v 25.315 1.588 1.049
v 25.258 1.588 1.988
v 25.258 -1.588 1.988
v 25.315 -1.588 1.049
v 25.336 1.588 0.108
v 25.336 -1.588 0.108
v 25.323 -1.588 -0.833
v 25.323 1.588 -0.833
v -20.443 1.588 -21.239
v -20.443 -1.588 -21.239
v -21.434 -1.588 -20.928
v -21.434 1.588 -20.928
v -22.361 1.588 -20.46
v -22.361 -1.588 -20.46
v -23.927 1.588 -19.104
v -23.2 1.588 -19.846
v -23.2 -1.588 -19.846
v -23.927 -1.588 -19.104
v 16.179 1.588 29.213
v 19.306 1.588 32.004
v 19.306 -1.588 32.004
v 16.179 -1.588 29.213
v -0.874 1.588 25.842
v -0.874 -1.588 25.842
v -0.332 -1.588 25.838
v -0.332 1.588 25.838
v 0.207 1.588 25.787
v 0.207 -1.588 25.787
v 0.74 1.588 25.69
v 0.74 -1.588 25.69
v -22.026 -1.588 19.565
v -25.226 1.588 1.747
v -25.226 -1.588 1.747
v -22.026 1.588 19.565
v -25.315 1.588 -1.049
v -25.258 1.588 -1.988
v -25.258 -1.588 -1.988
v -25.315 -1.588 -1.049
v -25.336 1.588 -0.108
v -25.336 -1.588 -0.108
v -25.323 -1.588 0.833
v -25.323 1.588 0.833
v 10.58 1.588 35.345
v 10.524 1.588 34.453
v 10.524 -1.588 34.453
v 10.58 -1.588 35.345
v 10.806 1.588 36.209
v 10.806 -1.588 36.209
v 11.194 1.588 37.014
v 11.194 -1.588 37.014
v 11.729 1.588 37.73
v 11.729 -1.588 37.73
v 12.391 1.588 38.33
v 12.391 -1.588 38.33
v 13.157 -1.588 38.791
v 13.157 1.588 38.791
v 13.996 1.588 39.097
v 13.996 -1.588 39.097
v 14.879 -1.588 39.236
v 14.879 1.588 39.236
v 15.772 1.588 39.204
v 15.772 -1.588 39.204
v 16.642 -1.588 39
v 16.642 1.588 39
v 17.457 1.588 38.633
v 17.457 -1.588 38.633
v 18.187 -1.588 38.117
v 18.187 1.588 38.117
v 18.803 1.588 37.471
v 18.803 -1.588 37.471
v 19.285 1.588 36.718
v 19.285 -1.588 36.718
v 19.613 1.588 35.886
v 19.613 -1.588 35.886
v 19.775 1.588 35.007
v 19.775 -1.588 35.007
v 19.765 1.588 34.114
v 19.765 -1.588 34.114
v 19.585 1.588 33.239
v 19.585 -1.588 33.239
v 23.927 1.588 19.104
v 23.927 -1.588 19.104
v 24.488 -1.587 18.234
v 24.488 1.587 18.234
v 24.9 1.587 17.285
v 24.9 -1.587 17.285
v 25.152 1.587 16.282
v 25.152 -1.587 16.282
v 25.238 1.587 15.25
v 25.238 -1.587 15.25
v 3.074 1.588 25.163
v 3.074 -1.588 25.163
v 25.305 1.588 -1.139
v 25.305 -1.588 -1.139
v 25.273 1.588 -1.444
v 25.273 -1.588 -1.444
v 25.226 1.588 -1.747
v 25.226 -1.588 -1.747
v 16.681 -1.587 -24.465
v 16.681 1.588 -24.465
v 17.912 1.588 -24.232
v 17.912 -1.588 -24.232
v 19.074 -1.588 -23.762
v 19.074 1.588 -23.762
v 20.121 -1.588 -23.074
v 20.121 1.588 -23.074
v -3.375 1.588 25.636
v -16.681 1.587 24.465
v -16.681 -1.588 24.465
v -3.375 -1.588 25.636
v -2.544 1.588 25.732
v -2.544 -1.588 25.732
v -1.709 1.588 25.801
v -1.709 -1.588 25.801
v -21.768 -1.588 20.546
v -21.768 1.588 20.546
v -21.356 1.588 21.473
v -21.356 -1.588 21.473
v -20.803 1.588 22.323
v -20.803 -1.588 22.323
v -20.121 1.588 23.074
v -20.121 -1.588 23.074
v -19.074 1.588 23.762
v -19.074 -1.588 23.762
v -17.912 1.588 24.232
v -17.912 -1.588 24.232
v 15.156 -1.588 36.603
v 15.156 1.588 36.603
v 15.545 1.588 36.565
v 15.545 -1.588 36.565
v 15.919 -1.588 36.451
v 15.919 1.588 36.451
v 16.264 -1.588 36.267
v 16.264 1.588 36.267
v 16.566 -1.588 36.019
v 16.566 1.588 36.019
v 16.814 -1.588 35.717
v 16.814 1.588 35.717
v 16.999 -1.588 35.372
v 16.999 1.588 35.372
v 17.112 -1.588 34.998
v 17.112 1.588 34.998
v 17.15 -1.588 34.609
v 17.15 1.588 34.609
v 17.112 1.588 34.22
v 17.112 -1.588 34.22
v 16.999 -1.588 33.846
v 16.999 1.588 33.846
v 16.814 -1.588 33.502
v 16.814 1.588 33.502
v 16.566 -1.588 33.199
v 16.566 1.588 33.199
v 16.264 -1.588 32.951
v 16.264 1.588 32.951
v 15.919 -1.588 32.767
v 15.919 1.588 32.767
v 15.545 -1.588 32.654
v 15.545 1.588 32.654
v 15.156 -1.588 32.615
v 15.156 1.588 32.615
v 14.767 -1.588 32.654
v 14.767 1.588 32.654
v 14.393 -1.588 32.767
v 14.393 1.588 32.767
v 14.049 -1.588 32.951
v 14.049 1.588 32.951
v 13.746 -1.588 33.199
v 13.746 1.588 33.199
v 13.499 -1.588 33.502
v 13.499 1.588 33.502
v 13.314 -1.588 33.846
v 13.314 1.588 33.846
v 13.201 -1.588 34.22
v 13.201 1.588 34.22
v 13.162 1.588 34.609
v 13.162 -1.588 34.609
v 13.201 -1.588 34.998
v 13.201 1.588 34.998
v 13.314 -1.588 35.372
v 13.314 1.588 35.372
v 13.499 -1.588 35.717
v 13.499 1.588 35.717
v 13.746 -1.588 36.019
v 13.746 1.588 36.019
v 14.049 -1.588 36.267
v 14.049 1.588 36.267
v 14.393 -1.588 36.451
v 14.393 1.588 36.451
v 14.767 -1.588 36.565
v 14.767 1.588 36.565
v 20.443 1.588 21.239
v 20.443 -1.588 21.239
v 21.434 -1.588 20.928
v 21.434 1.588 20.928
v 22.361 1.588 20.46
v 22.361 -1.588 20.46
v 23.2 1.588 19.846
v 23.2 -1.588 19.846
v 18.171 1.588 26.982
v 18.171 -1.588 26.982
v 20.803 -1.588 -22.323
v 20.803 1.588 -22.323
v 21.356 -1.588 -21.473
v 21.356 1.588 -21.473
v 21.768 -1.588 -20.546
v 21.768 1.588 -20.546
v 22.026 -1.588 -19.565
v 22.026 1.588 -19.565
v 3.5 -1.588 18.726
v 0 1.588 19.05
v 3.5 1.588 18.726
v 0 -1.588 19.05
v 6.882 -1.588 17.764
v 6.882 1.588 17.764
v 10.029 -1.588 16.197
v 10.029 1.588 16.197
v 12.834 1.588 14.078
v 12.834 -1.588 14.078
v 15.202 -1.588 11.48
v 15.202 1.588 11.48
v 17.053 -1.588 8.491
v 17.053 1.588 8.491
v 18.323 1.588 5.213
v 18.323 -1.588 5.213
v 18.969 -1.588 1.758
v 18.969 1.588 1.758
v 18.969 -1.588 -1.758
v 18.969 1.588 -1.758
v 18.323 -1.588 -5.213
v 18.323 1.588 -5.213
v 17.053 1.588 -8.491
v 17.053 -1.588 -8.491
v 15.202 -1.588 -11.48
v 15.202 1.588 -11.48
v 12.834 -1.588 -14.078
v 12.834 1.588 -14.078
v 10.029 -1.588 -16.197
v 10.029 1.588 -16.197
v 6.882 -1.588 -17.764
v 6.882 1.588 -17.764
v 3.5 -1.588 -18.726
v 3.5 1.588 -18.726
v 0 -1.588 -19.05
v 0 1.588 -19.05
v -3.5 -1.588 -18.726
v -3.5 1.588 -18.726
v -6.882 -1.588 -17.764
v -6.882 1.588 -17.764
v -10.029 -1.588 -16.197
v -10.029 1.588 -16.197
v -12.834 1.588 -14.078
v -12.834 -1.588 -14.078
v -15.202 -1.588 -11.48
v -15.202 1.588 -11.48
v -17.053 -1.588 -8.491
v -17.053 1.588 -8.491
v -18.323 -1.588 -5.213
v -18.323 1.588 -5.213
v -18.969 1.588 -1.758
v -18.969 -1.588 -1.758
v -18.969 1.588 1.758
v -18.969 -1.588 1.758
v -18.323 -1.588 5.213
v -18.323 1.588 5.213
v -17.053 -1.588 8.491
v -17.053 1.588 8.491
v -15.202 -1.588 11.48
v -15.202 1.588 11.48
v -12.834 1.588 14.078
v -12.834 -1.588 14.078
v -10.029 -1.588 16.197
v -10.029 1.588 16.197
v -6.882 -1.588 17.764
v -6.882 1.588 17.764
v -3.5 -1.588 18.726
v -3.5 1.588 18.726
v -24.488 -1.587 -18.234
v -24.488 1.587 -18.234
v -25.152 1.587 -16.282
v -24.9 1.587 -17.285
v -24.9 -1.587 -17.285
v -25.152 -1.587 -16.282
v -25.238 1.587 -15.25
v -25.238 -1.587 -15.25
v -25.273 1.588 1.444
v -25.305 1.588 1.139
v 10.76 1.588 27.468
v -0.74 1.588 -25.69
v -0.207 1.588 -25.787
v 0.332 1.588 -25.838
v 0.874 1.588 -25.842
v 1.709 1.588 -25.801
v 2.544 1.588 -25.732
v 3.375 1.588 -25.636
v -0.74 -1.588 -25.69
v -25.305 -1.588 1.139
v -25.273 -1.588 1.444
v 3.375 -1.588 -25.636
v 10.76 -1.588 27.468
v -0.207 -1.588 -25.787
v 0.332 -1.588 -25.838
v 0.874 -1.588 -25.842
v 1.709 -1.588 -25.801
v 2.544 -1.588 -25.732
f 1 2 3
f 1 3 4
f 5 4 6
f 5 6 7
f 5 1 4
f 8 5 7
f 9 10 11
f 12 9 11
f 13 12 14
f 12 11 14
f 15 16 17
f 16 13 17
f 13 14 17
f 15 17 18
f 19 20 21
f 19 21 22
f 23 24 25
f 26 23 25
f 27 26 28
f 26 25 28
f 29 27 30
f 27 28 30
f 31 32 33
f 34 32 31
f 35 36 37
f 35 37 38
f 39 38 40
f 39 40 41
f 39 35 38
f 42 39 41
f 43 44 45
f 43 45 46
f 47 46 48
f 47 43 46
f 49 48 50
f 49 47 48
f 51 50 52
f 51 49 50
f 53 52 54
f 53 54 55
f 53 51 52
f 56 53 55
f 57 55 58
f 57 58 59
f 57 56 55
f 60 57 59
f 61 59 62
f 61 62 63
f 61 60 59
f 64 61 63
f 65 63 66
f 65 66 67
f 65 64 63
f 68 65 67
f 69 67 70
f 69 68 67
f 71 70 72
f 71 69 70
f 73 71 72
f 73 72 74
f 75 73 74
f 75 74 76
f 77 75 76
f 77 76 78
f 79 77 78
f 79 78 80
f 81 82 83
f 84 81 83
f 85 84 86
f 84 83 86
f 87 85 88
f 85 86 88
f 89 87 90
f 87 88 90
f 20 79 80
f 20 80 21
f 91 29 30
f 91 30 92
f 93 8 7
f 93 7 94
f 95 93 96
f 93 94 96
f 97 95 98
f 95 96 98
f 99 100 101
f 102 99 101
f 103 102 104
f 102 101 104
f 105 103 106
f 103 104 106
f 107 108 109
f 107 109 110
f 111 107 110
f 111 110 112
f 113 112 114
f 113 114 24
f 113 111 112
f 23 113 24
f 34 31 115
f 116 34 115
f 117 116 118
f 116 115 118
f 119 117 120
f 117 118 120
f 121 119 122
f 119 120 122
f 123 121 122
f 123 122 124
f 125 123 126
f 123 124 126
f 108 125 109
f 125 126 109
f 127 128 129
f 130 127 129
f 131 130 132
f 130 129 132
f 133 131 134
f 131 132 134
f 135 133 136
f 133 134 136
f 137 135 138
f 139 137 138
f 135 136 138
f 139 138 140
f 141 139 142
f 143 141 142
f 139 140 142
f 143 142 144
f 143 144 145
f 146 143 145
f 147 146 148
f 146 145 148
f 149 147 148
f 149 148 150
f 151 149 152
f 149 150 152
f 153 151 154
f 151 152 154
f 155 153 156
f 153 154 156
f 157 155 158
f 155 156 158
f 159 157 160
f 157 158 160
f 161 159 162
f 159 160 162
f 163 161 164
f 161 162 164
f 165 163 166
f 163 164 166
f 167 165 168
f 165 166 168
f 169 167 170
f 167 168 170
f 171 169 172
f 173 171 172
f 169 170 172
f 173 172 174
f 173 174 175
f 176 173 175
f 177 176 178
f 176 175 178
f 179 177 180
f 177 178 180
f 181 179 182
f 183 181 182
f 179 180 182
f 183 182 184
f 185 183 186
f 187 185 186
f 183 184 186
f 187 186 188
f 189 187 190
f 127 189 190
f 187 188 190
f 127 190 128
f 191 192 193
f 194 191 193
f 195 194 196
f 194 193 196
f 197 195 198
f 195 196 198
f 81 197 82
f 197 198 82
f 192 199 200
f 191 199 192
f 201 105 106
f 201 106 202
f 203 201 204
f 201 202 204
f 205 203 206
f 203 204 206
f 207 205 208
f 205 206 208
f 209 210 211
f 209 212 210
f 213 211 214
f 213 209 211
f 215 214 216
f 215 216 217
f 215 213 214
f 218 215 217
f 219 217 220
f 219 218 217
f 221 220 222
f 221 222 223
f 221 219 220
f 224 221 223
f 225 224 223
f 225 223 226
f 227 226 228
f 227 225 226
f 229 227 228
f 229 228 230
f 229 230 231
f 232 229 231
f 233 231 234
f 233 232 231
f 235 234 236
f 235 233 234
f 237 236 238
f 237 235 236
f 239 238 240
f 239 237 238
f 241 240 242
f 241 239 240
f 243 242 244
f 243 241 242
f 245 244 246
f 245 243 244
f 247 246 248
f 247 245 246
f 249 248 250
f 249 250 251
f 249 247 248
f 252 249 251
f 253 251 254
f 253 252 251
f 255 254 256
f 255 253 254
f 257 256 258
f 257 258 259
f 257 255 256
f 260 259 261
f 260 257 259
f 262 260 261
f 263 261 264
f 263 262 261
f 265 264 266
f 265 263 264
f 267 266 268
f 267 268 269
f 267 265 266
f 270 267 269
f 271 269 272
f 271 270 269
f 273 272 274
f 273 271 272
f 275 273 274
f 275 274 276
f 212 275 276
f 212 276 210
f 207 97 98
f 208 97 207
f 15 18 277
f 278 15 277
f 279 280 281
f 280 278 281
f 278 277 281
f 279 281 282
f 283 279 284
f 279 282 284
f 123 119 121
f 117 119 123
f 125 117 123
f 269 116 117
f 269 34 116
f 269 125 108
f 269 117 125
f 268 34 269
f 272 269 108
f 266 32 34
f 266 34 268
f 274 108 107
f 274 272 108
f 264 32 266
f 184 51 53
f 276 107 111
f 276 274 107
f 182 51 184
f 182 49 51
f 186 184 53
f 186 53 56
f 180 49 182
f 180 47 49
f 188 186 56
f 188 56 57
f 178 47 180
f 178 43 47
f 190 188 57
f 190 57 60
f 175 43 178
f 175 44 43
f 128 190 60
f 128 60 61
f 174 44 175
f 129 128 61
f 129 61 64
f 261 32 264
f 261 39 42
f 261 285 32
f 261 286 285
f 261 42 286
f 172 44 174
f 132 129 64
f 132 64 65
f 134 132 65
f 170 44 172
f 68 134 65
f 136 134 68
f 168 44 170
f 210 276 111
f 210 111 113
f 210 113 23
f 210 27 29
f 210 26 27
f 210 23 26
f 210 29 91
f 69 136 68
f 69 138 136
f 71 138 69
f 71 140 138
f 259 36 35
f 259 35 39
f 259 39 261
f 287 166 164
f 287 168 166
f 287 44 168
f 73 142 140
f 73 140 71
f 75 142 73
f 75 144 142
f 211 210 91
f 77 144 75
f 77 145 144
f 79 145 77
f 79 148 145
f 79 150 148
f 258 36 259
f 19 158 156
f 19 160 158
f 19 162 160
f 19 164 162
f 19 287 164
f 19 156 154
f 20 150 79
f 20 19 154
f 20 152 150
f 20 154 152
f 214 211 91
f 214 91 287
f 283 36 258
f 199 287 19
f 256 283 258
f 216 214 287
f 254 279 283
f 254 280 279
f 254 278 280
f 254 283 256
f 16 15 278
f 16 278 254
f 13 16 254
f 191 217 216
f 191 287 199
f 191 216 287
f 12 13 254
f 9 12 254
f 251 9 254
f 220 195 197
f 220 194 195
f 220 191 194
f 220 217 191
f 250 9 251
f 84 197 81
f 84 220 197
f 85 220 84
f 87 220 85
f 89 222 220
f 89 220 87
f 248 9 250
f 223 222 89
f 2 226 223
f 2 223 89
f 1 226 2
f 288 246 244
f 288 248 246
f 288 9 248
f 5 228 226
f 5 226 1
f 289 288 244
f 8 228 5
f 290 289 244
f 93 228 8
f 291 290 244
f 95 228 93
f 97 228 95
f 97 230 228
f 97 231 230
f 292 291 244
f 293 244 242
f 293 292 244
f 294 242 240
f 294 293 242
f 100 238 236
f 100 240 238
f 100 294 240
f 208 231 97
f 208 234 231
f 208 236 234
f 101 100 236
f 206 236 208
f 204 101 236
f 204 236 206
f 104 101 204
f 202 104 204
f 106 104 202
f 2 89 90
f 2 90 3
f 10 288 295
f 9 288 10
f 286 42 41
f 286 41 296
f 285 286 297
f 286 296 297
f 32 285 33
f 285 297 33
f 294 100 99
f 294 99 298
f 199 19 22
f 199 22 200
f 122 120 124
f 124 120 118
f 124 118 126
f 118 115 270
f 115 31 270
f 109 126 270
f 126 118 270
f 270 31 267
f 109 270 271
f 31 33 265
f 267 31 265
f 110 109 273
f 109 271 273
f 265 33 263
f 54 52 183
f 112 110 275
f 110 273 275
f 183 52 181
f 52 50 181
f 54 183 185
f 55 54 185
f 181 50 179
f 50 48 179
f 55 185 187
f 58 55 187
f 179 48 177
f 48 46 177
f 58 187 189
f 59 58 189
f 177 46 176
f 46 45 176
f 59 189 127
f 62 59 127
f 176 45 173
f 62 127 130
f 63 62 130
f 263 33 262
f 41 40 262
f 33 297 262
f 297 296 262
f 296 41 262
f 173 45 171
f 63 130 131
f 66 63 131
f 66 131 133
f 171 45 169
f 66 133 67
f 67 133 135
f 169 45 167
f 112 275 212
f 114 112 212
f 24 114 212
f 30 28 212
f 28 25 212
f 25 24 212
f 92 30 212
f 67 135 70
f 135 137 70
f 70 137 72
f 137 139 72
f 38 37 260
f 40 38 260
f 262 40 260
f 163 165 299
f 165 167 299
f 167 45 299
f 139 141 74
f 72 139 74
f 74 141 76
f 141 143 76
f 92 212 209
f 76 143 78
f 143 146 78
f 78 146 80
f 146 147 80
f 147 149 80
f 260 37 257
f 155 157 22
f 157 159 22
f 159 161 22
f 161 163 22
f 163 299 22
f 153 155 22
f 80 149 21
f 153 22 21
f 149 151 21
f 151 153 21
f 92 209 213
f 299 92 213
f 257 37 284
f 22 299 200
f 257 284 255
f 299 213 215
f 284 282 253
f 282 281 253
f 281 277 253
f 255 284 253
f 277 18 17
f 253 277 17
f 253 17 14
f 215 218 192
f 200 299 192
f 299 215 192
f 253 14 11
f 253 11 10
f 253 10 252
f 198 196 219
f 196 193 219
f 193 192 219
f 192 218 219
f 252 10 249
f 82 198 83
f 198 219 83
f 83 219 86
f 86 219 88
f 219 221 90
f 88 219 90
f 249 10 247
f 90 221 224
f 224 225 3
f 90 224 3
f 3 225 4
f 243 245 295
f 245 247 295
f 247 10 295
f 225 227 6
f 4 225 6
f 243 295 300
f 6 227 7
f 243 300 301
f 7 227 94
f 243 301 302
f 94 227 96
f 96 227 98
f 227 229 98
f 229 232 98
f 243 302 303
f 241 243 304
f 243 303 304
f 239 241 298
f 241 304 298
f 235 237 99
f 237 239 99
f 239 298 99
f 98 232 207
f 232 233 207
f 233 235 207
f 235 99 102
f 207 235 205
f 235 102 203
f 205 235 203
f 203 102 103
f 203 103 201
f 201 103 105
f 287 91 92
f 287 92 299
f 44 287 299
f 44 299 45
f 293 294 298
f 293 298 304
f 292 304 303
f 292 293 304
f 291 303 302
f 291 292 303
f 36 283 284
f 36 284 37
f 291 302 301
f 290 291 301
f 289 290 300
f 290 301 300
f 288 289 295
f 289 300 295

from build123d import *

# Parameters (mm, degrees)
SKETCH1_R           = 19.05
BOSS_EXTRUDE1_DEPTH = 1.5875
FILLET1_R           = 6.35
SKETCH4_R           = 1.9939
BOSS_EXTRUDE2_DEPTH = 3.175


with BuildPart() as part:
    # Sketch1 → Boss-Extrude1 (new, symmetric)
    with BuildSketch(Plane(origin=(0, 0, 0), x_dir=(1, 0, 0), z_dir=(0, 1, 0))):
        with BuildLine():
            Line((0, 25.8572), (-22.49266633, 20.776091776))
            ThreePointArc((-22.49266633, 20.776091776), (-23.925232015, 19.108880164), (-25.234496658, 17.343189053))
            Line((-25.234496658, 17.343189053), (-25.258396026, 1.987878879))
            ThreePointArc((-25.258396026, 1.987878879), (-25.334329361, 0.331644538), (-25.301777207, -1.326009955))
            Line((-25.301777207, -1.326009955), (-21.651397508, -21.651397508))
            ThreePointArc((-21.651397508, -21.651397508), (-20.188971055, -23.021109353), (-18.640092328, -24.292241274))
            Line((-18.640092328, -24.292241274), (-3.375041857, -25.63598807))
            ThreePointArc((-3.375041857, -25.63598807), (-1.691141793, -25.80183775), (0, -25.8572))
            Line((0, -25.8572), (22.49266633, -20.776091776))
            ThreePointArc((22.49266633, -20.776091776), (23.925232015, -19.108880164), (25.234496658, -17.343189053))
            Line((25.234496658, -17.343189053), (25.258396026, -1.987878879))
            ThreePointArc((25.258396026, -1.987878879), (25.334329361, -0.331644538), (25.301777207, 1.326009955))
            Line((25.301777207, 1.326009955), (21.651397508, 21.651397508))
            ThreePointArc((21.651397508, 21.651397508), (20.188971055, 23.021109353), (18.640092328, 24.292241274))
            Line((18.640092328, 24.292241274), (3.375041857, 25.63598807))
            ThreePointArc((3.375041857, 25.63598807), (1.691141793, 25.80183775), (0, 25.8572))
        make_face()
        with Locations(Location((0, 0, 0), (0, 0, 270))):
            Circle(SKETCH1_R, mode=Mode.SUBTRACT)
    extrude(amount=BOSS_EXTRUDE1_DEPTH, both=True)

    # Fillet1
    # the kernel refuses this fillet: 6.35 mm, written as the material it takes off along each edge
    with BuildSketch(Plane(origin=(25.301777207, -2.821548673, -1.326009955), x_dir=(-0.17676882960283344, 0, -0.9842523969393442), z_dir=(0, 1, 0)), Plane(origin=(-25.301777207, -2.821548673, 1.326009955), x_dir=(0.17676882960285092, 0, 0.9842523969393412), z_dir=(0, 1, 0))) as fillet1_piece_1:
        with BuildLine():
            CenterArc((0.427308397, 6.35), FILLET1_R, 261.702105294, 8.297894706)
            ThreePointArc((-0.489122596, 0.066477562), (-0.244723196, 0.032047583), (0, 0))
            Line((0, 0), (0.427308397, 0))
        make_face()
    extrude(amount=5.643097347, mode=Mode.SUBTRACT)
    with BuildSketch(Plane(origin=(0, -3.771668691, -25.8572), x_dir=(0.9998572847598118, 0, 0.016894085140560105), z_dir=(0, 1, 0))) as fillet1_piece_2:
        with BuildLine():
            CenterArc((0.766390036, -6.349093758), FILLET1_R, 89.031994173, 14.665503243)
            Line((-0.737262724, -0.179691163), (0, 0))
            ThreePointArc((0, 0), (0.436833738, 0.003690217), (0.873667477, 0))
        make_face()
    extrude(amount=7.543337383, mode=Mode.SUBTRACT)
    with BuildSketch(Plane(origin=(-22.49266633, -7.488620609, -20.776091776), x_dir=(-0.649702048384586, 0, 0.7601889556714653), z_dir=(0, 1, 0)), Plane(origin=(22.49266633, -7.488620609, 20.776091776), x_dir=(0.6497020483845872, 0, -0.7601889556714644), z_dir=(0, 1, 0))) as fillet1_piece_3:
        with BuildLine():
            CenterArc((2.115690027, 6.345281193), FILLET1_R, 233.248632952, 38.960357221)
            Line((-1.683792582, 1.257410134), (0, 0))
            ThreePointArc((0, 0), (1.180224122, -0.022754088), (2.360448244, 0))
        make_face()
    extrude(amount=14.977241219, mode=Mode.SUBTRACT)
    with BuildSketch(Plane(origin=(-25.234496658, -7.46444532, -17.343189053), x_dir=(-0.0015564217956219107, 0, 0.9999987887748636), z_dir=(0, 1, 0)), Plane(origin=(25.234496658, -7.46444532, 17.343189053), x_dir=(0.0015564217956202159, 0, -0.9999987887748636), z_dir=(0, 1, 0))) as fillet1_piece_4:
        with BuildLine():
            CenterArc((2.092875431, 6.35), FILLET1_R, 231.189304273, 38.810695727)
            ThreePointArc((-1.886982522, 1.401946779), (-0.956950246, 0.682857958), (0, 0))
            Line((0, 0), (2.092875431, 0))
        make_face()
    extrude(amount=14.928890641, mode=Mode.SUBTRACT)
    with BuildSketch(Plane(origin=(-21.651397508, -7.539410962, 21.651397508), x_dir=(0.7340619600556395, 0, 0.6790824977860002), z_dir=(0, 1, 0))) as fillet1_piece_5:
        with BuildLine():
            CenterArc((2.133899558, 6.345199584), FILLET1_R, 232.953597243, 39.274415035)
            Line((-1.691731763, 1.276960738), (0, 0))
            ThreePointArc((0, 0), (1.190382192, -0.023147607), (2.380764385, 0))
        make_face()
    extrude(amount=15.078821924, mode=Mode.SUBTRACT)
    with BuildSketch(Plane(origin=(-18.640092328, -7.110021665, 24.292241274), x_dir=(0.9961479372781339, 0, 0.08768857996637193), z_dir=(0, 1, 0))) as fillet1_piece_6:
        with BuildLine():
            CenterArc((1.966659426, 6.35), FILLET1_R, 233.396238517, 36.603761483)
            ThreePointArc((-1.8197032, 1.252357597), (-0.92114894, 0.609763515), (0, 0))
            Line((0, 0), (1.966659426, 0))
        make_face()
    extrude(amount=14.22004333, mode=Mode.SUBTRACT)
    with BuildSketch(Plane(origin=(0, -3.771668691, 25.8572), x_dir=(0.9754212543155903, 0, -0.22034830752560894), z_dir=(0, 1, 0))) as fillet1_piece_7:
        with BuildLine():
            CenterArc((0.758844673, 6.35), FILLET1_R, 255.334496757, 14.665503243)
            ThreePointArc((-0.848819905, 0.206880711), (-0.42528378, 0.099855091), (0, 0))
            Line((0, 0), (0.758844673, 0))
        make_face()
    extrude(amount=7.543337383, mode=Mode.SUBTRACT)
    with BuildSketch(Plane(origin=(18.640092328, 7.110021665, -24.292241274), x_dir=(-0.9961479372781336, 0, -0.08768857996637594), z_dir=(0, -1, 0))) as fillet1_piece_8:
        with BuildLine():
            CenterArc((1.966659426, -6.35), FILLET1_R, 90, 36.603761483)
            ThreePointArc((-1.8197032, -1.252357597), (-0.92114894, -0.609763515), (0, 0))
            Line((0, 0), (1.966659426, 0))
        make_face()
    extrude(amount=14.22004333, mode=Mode.SUBTRACT)
    with BuildSketch(Plane(origin=(21.651397508, 7.539410962, -21.651397508), x_dir=(-0.7340619600556043, 0, -0.679082497786038), z_dir=(0, -1, 0))) as fillet1_piece_9:
        with BuildLine():
            CenterArc((2.133899558, -6.345199584), FILLET1_R, 87.771987722, 39.274415035)
            Line((-1.691731763, -1.276960738), (0, 0))
            ThreePointArc((0, 0), (1.190382192, 0.023147607), (2.380764385, 0))
        make_face()
    extrude(amount=15.078821924, mode=Mode.SUBTRACT)

    # Sketch4 → Boss-Extrude2 (add)
    with BuildSketch(Plane(origin=(0, 1.5875, 0), x_dir=(1, 0, 0), z_dir=(0, 1, 0))):
        with BuildLine():
            Line((18.171090284, -26.981546007), (20.442833543, -21.23915036))
            Line((20.442833543, -21.23915036), (16.989846709, -22.019182373))
            Line((16.989846709, -22.019182373), (11.9001109, -23.168957064))
            Line((11.9001109, -23.168957064), (3.07364609, -25.162861312))
            Line((3.07364609, -25.162861312), (10.75965287, -27.467658849))
            Line((10.75965287, -27.467658849), (10.523541405, -34.452658849))
            ThreePointArc((10.523541405, -34.452658849), (15.772035547, -39.203698132), (19.584588194, -33.238506824))
            Line((19.584588194, -33.238506824), (19.305744856, -32.004144185))
            Line((19.305744856, -32.004144185), (16.179043161, -29.213406378))
            Line((16.179043161, -29.213406378), (18.171090284, -26.981546007))
        make_face()
        with Locations(Location((15.156395368, -34.609261559, 0), (0, 0, 270))):
            Circle(SKETCH4_R, mode=Mode.SUBTRACT)
    extrude(amount=-BOSS_EXTRUDE2_DEPTH)


solid = part.part
